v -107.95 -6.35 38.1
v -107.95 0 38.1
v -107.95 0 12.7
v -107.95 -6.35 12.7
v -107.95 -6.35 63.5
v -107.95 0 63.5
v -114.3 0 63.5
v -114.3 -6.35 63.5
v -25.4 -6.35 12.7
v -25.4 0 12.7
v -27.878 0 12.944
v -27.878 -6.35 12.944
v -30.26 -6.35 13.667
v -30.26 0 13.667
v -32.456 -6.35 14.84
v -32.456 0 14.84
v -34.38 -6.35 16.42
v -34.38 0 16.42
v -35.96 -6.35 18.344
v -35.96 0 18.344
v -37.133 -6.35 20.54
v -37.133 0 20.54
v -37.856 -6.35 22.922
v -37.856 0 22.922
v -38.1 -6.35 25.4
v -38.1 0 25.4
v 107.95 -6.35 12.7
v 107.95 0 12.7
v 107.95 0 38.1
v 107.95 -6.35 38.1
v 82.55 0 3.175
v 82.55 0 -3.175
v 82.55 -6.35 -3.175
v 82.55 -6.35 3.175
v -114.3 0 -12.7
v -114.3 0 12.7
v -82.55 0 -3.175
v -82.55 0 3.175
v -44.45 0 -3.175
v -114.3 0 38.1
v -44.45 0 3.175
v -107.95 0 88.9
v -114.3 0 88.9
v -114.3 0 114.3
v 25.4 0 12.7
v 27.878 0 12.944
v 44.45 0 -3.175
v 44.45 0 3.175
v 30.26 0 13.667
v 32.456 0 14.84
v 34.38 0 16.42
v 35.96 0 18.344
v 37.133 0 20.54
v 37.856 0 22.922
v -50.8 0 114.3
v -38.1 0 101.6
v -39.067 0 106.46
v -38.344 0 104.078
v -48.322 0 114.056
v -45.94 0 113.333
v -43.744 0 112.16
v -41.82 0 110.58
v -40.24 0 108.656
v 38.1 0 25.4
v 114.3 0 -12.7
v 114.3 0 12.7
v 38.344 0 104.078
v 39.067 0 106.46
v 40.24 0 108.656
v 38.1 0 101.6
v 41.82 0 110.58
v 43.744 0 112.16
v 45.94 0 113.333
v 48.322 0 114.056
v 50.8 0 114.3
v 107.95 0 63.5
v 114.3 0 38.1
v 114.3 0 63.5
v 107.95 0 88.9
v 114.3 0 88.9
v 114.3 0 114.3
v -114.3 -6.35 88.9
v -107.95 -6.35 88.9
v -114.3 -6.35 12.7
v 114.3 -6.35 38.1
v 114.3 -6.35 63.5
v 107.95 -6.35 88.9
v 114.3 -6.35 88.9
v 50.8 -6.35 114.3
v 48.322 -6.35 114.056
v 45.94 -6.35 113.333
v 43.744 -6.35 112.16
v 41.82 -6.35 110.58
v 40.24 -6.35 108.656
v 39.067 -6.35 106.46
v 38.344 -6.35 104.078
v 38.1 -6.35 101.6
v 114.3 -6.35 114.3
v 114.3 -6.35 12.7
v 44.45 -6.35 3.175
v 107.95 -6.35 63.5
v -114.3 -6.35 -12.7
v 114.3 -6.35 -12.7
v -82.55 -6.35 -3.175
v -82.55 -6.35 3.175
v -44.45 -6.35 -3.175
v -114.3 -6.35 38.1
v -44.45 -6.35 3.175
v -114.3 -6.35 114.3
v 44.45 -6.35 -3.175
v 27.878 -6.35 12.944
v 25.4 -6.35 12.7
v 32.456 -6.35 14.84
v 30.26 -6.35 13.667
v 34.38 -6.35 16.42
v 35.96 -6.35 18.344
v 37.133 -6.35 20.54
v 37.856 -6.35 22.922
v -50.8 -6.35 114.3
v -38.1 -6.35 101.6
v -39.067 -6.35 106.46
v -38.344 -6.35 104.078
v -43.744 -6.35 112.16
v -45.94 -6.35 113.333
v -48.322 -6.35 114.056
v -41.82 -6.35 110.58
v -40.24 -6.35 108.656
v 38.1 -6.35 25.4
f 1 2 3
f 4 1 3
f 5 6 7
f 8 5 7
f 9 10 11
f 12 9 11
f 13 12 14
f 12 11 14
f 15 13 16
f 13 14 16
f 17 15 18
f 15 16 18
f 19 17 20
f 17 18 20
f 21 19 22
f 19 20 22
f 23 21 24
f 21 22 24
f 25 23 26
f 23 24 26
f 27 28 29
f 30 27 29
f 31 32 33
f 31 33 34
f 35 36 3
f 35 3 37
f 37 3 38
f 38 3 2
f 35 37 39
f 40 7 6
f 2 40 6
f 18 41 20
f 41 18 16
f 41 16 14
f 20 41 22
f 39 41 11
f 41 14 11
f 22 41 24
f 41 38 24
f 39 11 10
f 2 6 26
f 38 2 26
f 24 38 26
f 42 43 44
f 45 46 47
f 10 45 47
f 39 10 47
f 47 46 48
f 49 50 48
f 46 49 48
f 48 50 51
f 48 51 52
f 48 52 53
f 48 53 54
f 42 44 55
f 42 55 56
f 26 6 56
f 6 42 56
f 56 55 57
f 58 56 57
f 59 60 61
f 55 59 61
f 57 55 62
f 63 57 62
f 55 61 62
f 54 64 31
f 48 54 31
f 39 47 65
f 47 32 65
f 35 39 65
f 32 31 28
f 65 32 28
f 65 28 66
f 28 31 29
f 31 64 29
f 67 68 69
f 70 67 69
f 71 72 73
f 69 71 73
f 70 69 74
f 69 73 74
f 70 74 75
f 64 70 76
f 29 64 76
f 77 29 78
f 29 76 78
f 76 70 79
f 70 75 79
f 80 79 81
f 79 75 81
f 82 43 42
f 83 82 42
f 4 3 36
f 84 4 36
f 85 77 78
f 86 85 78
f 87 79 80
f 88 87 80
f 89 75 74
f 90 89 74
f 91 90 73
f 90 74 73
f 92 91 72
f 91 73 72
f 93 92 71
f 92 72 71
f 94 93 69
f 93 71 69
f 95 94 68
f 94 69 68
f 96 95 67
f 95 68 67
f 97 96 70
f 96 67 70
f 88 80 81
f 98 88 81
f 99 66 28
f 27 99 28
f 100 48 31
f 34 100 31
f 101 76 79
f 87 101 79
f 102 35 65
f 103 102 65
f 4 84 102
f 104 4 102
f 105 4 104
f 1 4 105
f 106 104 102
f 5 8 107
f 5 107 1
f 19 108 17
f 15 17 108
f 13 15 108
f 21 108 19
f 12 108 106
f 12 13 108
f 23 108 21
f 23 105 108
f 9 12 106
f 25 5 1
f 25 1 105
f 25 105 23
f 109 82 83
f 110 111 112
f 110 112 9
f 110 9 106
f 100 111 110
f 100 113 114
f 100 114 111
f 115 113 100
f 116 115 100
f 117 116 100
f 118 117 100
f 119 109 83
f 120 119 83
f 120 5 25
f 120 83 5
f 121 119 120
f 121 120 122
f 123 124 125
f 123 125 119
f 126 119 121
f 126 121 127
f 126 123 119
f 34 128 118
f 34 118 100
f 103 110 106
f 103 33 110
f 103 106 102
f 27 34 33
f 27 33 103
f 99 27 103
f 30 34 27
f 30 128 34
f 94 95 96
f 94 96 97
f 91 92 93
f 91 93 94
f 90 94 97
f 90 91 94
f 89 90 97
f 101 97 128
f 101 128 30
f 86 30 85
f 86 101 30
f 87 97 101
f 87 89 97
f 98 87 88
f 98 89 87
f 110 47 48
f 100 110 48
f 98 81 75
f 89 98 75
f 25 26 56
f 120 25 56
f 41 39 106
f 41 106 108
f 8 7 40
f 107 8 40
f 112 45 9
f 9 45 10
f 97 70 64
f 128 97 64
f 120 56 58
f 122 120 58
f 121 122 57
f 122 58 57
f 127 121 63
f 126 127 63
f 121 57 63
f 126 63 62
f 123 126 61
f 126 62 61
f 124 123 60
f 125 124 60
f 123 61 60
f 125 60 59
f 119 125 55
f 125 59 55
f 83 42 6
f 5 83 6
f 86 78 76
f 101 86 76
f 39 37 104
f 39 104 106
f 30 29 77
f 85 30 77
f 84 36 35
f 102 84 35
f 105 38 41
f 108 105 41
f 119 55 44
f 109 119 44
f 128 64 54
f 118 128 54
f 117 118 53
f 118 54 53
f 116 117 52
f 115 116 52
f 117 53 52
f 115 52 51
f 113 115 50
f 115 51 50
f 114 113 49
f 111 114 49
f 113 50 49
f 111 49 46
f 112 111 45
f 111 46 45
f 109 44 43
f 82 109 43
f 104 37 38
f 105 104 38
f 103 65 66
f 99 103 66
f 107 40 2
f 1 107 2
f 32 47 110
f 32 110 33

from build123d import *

# Parameters (mm, degrees)
F0_W     = 38.1
F0_H     = 6.35
F1_DEPTH = 6.35


with BuildPart() as f1:
    # F0 (on Front) → F1 (new body)
    with BuildSketch(Plane.XZ):
        with BuildLine():
            Line((-114.3, -12.7), (114.3, -12.7))
            Line((114.3, -12.7), (114.3, 12.7))
            Line((114.3, 12.7), (107.95, 12.7))
            Line((107.95, 12.7), (107.95, 38.1))
            Line((107.95, 38.1), (114.3, 38.1))
            Line((114.3, 38.1), (114.3, 63.5))
            Line((114.3, 63.5), (107.95, 63.5))
            Line((107.95, 63.5), (107.95, 88.9))
            Line((107.95, 88.9), (114.3, 88.9))
            Line((114.3, 88.9), (114.3, 114.3))
            Line((114.3, 114.3), (50.8, 114.3))
            ThreePointArc((50.8, 114.3), (41.819744, 110.580256), (38.1, 101.6))
            Line((38.1, 101.6), (38.1, 25.4))
            ThreePointArc((38.1, 25.4), (34.380256, 16.419744), (25.4, 12.7))
            Line((25.4, 12.7), (-25.4, 12.7))
            ThreePointArc((-25.4, 12.7), (-34.380256, 16.419744), (-38.1, 25.4))
            Line((-38.1, 25.4), (-38.1, 101.6))
            ThreePointArc((-38.1, 101.6), (-41.819744, 110.580256), (-50.8, 114.3))
            Line((-50.8, 114.3), (-114.3, 114.3))
            Line((-114.3, 114.3), (-114.3, 88.9))
            Line((-114.3, 88.9), (-107.95, 88.9))
            Line((-107.95, 88.9), (-107.95, 63.5))
            Line((-107.95, 63.5), (-114.3, 63.5))
            Line((-114.3, 63.5), (-114.3, 38.1))
            Line((-114.3, 38.1), (-107.95, 38.1))
            Line((-107.95, 38.1), (-107.95, 12.7))
            Line((-107.95, 12.7), (-114.3, 12.7))
            Line((-114.3, 12.7), (-114.3, -12.7))
        make_face()
        with Locations((-63.5, 0)):
            Rectangle(F0_W, F0_H, mode=Mode.SUBTRACT)
        with Locations((63.5, 0)):
            Rectangle(F0_W, F0_H, mode=Mode.SUBTRACT)
    extrude(amount=F1_DEPTH)


solid = f1.part
